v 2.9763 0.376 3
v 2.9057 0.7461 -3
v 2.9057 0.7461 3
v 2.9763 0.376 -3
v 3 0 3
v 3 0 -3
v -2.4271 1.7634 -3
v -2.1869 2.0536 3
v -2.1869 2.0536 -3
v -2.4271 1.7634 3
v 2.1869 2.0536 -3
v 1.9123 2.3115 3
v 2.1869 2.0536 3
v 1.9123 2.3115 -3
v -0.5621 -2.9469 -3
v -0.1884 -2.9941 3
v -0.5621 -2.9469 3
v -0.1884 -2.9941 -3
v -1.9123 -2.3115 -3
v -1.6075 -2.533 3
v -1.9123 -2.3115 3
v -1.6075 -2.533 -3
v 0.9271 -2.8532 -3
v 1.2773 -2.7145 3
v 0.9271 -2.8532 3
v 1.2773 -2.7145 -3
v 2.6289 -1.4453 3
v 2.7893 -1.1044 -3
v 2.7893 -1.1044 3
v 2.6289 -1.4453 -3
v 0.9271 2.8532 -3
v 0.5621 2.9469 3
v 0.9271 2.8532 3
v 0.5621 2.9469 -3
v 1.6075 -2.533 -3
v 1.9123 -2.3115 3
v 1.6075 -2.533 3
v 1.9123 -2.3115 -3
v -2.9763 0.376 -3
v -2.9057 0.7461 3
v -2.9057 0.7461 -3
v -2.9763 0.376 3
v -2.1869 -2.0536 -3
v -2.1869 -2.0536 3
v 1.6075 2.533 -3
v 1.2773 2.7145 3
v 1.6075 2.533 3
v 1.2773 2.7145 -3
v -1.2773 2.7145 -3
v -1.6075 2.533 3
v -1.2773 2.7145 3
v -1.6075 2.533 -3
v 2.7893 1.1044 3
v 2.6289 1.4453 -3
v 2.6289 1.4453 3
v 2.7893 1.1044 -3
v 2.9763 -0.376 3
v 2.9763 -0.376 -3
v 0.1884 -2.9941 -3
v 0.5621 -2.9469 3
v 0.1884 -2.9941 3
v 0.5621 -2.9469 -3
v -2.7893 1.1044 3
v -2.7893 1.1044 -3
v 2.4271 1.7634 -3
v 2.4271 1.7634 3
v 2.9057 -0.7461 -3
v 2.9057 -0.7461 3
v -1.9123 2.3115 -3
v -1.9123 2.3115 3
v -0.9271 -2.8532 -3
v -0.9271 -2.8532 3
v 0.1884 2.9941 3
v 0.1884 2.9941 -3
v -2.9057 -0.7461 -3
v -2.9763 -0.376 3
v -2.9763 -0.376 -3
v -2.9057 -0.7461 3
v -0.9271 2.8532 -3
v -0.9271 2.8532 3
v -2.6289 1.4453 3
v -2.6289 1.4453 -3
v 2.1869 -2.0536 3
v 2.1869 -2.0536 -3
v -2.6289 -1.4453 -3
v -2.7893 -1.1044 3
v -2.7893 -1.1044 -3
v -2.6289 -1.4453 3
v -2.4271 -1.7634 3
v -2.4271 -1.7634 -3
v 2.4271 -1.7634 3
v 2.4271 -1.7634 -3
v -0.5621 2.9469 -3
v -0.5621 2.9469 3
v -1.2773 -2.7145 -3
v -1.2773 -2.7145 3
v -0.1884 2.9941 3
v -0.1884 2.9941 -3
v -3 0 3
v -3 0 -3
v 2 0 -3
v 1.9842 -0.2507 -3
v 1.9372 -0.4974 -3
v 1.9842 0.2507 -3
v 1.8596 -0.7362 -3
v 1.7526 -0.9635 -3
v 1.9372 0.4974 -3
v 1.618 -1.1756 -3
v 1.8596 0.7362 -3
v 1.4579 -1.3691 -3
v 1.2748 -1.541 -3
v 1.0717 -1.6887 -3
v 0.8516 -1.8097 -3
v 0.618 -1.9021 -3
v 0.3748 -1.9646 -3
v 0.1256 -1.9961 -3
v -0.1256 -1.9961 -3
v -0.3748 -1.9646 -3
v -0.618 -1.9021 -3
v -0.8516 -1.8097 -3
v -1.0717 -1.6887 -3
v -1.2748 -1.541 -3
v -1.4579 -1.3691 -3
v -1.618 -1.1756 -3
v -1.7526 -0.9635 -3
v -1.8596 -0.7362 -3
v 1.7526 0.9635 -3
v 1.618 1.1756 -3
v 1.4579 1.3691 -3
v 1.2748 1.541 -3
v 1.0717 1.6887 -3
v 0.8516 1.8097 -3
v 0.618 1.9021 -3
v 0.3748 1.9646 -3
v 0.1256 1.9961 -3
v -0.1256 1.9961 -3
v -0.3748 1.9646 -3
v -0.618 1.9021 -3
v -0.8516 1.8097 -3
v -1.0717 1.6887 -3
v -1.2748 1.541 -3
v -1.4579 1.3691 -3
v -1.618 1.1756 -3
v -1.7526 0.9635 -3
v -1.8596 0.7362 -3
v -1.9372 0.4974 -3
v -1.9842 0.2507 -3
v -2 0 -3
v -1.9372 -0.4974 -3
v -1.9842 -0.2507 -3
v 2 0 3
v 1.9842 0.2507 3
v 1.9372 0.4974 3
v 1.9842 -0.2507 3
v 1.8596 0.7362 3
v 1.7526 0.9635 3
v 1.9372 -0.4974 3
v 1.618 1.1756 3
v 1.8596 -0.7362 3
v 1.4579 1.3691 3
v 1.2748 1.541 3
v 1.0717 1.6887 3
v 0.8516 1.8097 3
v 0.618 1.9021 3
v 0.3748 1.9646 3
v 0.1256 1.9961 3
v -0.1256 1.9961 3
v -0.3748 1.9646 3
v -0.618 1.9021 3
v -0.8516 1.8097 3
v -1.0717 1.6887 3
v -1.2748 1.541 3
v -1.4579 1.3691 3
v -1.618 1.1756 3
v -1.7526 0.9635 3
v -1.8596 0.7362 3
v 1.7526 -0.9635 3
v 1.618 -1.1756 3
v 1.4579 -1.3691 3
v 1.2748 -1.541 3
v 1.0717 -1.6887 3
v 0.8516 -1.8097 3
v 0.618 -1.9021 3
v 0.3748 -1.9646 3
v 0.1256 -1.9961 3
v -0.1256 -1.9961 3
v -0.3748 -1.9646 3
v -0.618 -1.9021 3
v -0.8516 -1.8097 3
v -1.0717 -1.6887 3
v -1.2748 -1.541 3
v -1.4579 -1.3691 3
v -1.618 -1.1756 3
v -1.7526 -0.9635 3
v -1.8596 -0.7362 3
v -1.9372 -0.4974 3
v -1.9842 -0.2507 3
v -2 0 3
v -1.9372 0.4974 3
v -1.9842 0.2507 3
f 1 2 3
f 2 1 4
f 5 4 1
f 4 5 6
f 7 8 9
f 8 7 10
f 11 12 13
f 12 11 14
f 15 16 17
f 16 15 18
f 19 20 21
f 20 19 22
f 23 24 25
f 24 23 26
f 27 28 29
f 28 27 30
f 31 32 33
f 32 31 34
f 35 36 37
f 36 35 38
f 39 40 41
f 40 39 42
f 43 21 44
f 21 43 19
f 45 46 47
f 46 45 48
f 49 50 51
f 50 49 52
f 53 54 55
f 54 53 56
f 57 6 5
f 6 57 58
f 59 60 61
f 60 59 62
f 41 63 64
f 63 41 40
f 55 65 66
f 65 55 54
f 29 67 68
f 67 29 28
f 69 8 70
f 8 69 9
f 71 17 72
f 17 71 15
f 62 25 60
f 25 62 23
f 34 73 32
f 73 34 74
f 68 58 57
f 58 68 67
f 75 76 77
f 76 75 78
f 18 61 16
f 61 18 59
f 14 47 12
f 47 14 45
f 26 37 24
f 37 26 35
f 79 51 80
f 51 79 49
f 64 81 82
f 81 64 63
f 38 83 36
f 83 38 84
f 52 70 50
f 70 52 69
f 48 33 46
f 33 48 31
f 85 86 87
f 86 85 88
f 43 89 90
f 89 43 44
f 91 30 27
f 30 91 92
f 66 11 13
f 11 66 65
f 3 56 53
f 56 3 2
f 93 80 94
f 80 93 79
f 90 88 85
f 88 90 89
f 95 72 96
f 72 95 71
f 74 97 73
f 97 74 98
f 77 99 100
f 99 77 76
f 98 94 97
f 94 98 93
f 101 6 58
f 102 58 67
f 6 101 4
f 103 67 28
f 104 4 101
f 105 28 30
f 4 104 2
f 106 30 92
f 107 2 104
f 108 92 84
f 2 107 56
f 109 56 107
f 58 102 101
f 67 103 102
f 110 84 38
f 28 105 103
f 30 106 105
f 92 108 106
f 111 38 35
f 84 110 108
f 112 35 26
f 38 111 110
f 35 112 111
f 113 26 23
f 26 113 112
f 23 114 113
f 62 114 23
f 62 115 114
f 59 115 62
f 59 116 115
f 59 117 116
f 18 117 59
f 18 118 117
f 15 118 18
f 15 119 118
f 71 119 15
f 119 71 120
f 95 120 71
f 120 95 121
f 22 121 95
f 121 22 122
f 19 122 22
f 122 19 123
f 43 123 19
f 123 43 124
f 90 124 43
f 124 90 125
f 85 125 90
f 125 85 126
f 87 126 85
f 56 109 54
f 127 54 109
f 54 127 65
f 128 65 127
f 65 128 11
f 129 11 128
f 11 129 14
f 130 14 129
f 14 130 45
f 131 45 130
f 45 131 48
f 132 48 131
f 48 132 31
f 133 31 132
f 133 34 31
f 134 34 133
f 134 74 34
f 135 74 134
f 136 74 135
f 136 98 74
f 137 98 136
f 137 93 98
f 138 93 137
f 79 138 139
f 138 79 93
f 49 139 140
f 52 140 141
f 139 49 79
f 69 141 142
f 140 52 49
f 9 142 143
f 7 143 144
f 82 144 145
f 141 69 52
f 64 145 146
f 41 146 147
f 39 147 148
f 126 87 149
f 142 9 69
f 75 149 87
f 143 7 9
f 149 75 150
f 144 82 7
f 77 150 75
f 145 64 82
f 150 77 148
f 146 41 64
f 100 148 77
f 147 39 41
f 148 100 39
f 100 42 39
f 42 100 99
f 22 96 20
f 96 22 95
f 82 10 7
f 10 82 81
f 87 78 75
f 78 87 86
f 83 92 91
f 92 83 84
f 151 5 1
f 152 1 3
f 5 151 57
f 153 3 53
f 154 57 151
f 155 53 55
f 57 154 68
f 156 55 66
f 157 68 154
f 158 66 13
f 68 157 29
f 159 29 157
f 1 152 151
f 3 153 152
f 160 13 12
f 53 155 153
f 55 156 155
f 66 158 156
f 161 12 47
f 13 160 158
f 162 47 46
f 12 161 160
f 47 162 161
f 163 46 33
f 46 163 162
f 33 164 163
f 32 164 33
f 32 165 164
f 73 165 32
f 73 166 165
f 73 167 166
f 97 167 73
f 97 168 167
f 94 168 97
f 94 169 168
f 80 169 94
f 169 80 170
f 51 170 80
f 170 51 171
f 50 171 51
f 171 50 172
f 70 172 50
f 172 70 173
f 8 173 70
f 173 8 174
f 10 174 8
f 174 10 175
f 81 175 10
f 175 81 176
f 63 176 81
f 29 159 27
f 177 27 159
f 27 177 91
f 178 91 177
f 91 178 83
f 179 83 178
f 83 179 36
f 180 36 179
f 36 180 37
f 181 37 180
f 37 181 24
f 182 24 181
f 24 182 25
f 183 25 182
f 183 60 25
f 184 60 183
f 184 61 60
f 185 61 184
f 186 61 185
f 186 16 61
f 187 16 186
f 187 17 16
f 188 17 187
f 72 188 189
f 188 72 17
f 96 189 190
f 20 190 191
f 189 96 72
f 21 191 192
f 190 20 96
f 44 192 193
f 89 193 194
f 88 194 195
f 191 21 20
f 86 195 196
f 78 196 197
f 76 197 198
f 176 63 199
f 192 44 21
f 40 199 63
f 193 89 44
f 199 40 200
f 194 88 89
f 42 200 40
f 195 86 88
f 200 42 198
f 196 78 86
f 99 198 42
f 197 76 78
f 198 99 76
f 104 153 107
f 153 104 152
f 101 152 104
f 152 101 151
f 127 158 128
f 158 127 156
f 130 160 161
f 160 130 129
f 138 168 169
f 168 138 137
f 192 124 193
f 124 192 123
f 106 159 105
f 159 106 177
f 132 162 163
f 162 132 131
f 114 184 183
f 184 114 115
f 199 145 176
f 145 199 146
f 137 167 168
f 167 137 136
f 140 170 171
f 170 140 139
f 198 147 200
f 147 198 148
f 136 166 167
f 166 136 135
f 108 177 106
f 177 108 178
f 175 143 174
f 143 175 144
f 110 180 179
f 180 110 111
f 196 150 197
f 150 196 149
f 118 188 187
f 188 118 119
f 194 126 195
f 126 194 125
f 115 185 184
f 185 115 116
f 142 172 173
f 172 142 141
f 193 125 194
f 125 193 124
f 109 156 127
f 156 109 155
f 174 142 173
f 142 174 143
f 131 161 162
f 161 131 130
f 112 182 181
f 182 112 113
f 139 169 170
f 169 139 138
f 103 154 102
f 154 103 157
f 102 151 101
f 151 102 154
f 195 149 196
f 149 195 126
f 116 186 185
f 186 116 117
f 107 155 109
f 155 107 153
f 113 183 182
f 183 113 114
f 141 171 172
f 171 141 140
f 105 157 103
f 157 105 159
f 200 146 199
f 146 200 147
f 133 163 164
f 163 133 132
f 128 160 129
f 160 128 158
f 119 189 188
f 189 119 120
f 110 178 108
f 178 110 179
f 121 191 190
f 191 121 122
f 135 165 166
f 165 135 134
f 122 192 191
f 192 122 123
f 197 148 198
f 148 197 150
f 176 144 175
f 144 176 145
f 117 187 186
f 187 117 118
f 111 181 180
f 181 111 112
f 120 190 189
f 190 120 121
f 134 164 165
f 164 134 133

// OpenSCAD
$fn = 50;


difference() {
	union() {
		translate(v = [0, 0, -3.0000000000]) {
			cylinder(h = 6, r = 3.0000000000);
		}
	}
	union() {
		translate(v = [0, 0, -100.0000000000]) {
			cylinder(h = 200, r = 2.0000000000);
		}
	}
}
